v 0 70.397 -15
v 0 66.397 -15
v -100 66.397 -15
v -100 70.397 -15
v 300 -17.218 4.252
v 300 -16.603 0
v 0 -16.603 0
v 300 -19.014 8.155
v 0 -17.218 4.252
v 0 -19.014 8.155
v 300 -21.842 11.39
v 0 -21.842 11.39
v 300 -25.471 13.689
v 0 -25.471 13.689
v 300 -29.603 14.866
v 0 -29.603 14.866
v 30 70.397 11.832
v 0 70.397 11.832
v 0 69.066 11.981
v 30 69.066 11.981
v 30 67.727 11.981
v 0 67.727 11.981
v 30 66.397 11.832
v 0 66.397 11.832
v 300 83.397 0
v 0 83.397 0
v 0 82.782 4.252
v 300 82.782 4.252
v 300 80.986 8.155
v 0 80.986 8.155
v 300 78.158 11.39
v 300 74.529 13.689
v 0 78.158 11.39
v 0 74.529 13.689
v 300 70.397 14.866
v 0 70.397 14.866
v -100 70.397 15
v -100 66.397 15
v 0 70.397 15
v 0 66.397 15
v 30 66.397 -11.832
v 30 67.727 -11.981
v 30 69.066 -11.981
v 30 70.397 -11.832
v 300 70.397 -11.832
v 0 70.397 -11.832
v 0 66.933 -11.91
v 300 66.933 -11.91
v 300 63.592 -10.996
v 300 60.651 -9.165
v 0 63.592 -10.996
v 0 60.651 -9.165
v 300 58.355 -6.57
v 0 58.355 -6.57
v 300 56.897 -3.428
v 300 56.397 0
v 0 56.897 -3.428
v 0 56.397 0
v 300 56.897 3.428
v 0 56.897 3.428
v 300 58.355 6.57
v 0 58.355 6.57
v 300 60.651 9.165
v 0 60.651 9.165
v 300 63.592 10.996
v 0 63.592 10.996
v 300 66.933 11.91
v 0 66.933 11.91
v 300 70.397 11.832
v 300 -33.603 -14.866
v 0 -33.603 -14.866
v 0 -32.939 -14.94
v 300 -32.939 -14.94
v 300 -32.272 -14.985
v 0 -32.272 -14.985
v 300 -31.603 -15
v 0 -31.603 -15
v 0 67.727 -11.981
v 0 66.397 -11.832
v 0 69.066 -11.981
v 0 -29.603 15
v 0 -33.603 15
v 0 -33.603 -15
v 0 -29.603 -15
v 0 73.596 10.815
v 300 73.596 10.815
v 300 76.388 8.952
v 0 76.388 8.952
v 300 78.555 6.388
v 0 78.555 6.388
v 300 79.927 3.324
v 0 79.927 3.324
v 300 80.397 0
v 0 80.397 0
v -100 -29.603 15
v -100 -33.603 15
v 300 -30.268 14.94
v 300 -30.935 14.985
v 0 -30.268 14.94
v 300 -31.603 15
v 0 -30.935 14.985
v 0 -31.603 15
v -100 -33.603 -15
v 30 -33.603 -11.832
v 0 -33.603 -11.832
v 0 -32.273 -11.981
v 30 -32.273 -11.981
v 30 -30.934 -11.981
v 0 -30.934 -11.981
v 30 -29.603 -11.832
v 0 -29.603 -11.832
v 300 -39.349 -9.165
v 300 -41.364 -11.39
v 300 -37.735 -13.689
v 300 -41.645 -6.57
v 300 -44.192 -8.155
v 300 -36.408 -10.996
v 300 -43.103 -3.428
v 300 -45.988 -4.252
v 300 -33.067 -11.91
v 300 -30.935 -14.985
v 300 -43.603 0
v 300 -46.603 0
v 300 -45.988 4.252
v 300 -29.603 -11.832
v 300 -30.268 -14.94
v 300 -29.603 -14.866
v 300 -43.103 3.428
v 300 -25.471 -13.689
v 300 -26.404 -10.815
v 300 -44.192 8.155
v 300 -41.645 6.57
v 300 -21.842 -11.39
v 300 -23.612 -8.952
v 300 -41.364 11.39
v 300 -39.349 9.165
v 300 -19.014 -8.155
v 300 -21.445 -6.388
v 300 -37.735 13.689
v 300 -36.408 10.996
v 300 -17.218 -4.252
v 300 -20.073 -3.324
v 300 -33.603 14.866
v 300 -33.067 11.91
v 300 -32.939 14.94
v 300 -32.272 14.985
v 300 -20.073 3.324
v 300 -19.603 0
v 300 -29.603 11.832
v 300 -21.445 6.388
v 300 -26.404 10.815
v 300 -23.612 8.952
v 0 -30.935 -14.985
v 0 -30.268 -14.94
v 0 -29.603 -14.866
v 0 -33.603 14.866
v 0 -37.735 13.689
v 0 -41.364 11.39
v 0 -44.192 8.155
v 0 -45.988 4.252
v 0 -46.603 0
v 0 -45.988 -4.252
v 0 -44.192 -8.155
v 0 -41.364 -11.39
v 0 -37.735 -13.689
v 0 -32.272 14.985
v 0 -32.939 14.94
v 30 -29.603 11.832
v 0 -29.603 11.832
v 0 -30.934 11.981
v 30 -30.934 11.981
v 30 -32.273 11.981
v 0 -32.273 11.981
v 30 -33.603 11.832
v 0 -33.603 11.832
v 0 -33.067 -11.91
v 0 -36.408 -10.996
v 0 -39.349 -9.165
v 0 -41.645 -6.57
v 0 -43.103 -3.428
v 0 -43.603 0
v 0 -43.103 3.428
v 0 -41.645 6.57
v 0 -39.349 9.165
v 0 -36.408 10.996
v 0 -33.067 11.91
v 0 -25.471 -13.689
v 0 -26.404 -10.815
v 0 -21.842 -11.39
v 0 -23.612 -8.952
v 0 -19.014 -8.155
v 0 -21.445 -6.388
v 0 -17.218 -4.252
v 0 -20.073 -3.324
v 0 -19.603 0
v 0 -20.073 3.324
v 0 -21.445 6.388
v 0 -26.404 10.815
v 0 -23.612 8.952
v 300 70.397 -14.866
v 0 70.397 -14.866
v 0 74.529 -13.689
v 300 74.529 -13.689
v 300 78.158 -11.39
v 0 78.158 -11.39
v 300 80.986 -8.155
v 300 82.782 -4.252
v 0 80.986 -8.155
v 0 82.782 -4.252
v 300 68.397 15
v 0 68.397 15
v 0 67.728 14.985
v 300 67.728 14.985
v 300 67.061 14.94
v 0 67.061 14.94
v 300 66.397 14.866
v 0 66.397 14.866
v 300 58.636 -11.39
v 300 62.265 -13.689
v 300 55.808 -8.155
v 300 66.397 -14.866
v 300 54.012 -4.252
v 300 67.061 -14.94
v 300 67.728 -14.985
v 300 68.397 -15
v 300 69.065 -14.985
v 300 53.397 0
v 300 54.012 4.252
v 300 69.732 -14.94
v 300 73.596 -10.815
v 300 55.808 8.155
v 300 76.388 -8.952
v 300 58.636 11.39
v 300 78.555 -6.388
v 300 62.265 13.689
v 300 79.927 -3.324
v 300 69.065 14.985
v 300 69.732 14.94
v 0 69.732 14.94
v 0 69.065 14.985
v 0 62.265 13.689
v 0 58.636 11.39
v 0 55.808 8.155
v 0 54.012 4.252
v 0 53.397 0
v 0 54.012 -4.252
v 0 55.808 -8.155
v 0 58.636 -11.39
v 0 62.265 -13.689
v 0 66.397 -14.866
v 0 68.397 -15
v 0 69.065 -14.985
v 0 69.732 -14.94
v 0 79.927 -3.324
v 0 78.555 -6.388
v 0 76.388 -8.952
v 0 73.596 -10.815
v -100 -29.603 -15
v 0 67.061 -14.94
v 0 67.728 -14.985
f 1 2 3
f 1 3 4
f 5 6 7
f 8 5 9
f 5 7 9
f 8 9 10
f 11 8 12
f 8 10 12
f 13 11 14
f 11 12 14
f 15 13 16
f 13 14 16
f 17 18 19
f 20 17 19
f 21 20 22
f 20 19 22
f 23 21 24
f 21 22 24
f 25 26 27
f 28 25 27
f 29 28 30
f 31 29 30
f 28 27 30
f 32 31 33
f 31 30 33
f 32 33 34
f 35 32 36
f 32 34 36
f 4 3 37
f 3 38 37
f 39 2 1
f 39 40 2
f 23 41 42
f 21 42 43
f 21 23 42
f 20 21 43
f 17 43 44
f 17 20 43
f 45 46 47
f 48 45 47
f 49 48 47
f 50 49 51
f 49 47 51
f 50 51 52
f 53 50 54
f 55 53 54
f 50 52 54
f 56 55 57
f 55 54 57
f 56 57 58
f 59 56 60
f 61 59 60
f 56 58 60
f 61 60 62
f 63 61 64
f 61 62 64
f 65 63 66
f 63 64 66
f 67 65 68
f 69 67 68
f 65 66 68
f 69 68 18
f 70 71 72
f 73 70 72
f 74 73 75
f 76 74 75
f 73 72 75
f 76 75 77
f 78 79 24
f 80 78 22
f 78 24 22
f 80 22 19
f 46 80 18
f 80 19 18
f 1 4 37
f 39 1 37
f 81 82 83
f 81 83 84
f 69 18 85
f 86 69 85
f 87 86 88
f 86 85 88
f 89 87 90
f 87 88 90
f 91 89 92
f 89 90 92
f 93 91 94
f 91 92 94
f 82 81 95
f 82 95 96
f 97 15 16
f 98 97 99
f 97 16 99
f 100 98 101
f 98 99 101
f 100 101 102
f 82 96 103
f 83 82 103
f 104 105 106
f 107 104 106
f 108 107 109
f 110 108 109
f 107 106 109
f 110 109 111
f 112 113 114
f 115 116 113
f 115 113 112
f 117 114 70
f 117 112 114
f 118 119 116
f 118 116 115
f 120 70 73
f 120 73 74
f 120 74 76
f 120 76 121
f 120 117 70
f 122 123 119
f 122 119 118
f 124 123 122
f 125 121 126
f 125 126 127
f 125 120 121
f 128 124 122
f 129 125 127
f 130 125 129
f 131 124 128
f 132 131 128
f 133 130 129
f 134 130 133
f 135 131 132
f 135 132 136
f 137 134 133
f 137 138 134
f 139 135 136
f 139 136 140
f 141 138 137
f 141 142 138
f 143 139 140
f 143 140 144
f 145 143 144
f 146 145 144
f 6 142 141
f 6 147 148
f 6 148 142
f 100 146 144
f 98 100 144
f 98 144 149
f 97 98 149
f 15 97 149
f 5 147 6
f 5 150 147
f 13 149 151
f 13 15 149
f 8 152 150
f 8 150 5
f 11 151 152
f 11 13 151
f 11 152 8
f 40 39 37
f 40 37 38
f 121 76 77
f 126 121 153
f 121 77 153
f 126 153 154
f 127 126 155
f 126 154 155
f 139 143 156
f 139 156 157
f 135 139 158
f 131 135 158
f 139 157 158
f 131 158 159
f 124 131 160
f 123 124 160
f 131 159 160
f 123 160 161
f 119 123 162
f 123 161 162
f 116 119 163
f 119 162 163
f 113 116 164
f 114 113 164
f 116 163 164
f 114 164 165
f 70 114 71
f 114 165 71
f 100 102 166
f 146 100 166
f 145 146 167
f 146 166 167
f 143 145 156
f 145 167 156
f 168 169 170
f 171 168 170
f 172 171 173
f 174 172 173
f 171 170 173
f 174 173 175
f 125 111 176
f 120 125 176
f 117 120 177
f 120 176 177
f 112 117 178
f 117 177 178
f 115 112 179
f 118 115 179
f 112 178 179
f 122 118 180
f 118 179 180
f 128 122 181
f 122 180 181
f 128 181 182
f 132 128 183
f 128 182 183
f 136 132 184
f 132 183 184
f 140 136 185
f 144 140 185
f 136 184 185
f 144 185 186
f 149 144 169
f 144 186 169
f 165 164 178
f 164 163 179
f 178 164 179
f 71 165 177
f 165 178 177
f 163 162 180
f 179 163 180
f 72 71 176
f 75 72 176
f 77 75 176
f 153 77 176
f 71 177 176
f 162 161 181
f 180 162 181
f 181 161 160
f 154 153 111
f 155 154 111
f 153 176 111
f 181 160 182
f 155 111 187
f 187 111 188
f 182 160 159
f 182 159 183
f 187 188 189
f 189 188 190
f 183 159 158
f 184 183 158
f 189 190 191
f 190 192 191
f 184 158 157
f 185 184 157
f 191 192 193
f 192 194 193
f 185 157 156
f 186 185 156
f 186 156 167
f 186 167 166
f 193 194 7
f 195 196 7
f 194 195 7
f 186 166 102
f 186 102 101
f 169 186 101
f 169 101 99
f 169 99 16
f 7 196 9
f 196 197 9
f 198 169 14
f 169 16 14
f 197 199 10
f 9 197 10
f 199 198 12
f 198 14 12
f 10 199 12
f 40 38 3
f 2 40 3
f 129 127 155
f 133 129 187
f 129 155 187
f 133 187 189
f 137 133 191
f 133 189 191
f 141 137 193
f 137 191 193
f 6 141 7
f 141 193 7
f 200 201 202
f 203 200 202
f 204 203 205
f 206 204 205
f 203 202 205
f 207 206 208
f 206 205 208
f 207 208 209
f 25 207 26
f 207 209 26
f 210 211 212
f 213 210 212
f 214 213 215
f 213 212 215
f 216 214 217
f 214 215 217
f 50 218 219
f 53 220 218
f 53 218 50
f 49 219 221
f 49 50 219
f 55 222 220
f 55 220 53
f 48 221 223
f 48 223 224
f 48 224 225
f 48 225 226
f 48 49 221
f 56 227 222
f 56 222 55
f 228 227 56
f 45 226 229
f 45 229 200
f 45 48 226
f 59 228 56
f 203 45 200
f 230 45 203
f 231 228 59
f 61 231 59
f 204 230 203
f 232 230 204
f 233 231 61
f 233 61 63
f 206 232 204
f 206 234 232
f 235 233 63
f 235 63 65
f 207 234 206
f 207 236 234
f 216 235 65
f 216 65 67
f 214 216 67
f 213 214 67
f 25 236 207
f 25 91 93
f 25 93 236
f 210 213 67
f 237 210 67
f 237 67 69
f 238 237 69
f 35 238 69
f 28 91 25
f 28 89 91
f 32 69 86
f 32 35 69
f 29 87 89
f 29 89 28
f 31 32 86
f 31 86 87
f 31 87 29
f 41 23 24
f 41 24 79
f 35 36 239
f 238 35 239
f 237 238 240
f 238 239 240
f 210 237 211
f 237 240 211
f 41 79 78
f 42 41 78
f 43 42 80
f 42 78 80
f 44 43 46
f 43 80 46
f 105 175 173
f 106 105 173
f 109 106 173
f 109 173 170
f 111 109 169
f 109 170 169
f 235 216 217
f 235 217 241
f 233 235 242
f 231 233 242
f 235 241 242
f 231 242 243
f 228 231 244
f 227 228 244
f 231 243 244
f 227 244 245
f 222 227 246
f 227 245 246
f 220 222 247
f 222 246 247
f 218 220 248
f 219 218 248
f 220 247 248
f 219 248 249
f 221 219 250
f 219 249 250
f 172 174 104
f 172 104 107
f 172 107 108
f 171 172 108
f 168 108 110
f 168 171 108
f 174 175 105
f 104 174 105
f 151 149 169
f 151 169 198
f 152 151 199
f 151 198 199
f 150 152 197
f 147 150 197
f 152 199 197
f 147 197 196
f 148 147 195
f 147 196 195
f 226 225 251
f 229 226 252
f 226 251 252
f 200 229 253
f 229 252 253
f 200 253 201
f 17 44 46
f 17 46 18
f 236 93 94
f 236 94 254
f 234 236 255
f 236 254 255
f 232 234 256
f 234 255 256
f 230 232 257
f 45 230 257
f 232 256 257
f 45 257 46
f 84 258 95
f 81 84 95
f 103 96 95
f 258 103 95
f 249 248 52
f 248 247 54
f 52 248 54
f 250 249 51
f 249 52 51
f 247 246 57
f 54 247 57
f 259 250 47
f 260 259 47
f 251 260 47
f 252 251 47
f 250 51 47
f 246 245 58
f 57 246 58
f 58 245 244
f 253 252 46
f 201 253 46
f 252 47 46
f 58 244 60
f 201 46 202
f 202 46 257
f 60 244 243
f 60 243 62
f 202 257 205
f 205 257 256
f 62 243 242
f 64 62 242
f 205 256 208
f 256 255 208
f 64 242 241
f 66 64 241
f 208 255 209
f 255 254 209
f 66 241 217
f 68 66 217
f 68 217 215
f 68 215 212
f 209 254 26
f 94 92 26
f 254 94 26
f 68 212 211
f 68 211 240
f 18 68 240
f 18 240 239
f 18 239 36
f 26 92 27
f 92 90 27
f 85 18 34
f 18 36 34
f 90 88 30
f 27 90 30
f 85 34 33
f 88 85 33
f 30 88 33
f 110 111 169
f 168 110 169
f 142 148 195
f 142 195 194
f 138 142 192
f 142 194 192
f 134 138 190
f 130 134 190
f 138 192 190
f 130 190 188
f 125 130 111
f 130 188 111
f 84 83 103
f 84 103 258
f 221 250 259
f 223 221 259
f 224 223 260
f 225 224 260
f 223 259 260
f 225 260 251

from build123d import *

# Parameters (mm, degrees)
F1_DEPTH = 100
F2_DEPTH = 300
F3_DEPTH = 30


with BuildPart() as f1:
    # F0 (on Right) → F1 (new body)
    with BuildSketch(Plane.YZ):
        with BuildLine():
            Line((70.3968688385, -11.8321595662), (70.3968688385, 11.8321595662))
            ThreePointArc((70.3968688385, 11.8321595662), (68.3968688385, 12), (66.3968688385, 11.8321595662))
            Line((66.3968688385, 11.8321595662), (66.3968688385, -11.8321595662))
            ThreePointArc((66.3968688385, -11.8321595662), (68.3968688385, -12), (70.3968688385, -11.8321595662))
        make_face()
        with BuildLine():
            Line((66.3968688385, -15), (68.3968688385, -15))
            ThreePointArc((68.3968688385, -15), (67.3946291491, -14.9664797332), (66.3968688385, -14.8660687473))
            Line((66.3968688385, -14.8660687473), (66.3968688385, -15))
        make_face()
        with BuildLine():
            Line((70.3968688385, -15), (70.3968688385, -14.8660687473))
            ThreePointArc((70.3968688385, -14.8660687473), (69.399108528, -14.9664797332), (68.3968688385, -15))
            Line((68.3968688385, -15), (70.3968688385, -15))
        make_face()
        with BuildLine():
            ThreePointArc((68.3968688385, -15), (69.399108528, -14.9664797332), (70.3968688385, -14.8660687473))
            Line((70.3968688385, -14.8660687473), (70.3968688385, -11.8321595662))
            ThreePointArc((70.3968688385, -11.8321595662), (68.3968688385, -12), (66.3968688385, -11.8321595662))
            Line((66.3968688385, -11.8321595662), (66.3968688385, -14.8660687473))
            ThreePointArc((66.3968688385, -14.8660687473), (67.3946291491, -14.9664797332), (68.3968688385, -15))
        make_face()
        with BuildLine():
            Line((70.3968688385, 11.8321595662), (70.3968688385, 14.8660687473))
            ThreePointArc((70.3968688385, 14.8660687473), (69.399108528, 14.9664797332), (68.3968688385, 15))
            ThreePointArc((68.3968688385, 15), (67.3946291491, 14.9664797332), (66.3968688385, 14.8660687473))
            Line((66.3968688385, 14.8660687473), (66.3968688385, 11.8321595662))
            ThreePointArc((66.3968688385, 11.8321595662), (68.3968688385, 12), (70.3968688385, 11.8321595662))
        make_face()
        with BuildLine():
            ThreePointArc((66.3968688385, 14.8660687473), (67.3946291491, 14.9664797332), (68.3968688385, 15))
            Line((68.3968688385, 15), (66.3968688385, 15))
            Line((66.3968688385, 15), (66.3968688385, 14.8660687473))
        make_face()
        with BuildLine():
            ThreePointArc((68.3968688385, 15), (69.399108528, 14.9664797332), (70.3968688385, 14.8660687473))
            Line((70.3968688385, 14.8660687473), (70.3968688385, 15))
            Line((70.3968688385, 15), (68.3968688385, 15))
        make_face()
    extrude(amount=-F1_DEPTH)


with BuildPart() as f1b:
    # F0 (on Right) → F1, piece 2 (new body)
    with BuildSketch(Plane.YZ):
        with BuildLine():
            ThreePointArc((-31.6031311615, 15), (-30.600891472, 14.9664797332), (-29.6031311615, 14.8660687473))
            Line((-29.6031311615, 14.8660687473), (-29.6031311615, 15))
            Line((-29.6031311615, 15), (-31.6031311615, 15))
        make_face()
        with BuildLine():
            ThreePointArc((-33.6031311615, 14.8660687473), (-32.6053708509, 14.9664797332), (-31.6031311615, 15))
            Line((-31.6031311615, 15), (-33.6031311615, 15))
            Line((-33.6031311615, 15), (-33.6031311615, 14.8660687473))
        make_face()
        with BuildLine():
            Line((-29.6031311615, 11.8321595662), (-29.6031311615, 14.8660687473))
            ThreePointArc((-29.6031311615, 14.8660687473), (-30.600891472, 14.9664797332), (-31.6031311615, 15))
            ThreePointArc((-31.6031311615, 15), (-32.6053708509, 14.9664797332), (-33.6031311615, 14.8660687473))
            Line((-33.6031311615, 14.8660687473), (-33.6031311615, 11.8321595662))
            ThreePointArc((-33.6031311615, 11.8321595662), (-31.6031311615, 12), (-29.6031311615, 11.8321595662))
        make_face()
        with BuildLine():
            Line((-29.6031311615, -11.8321595662), (-29.6031311615, 11.8321595662))
            ThreePointArc((-29.6031311615, 11.8321595662), (-31.6031311615, 12), (-33.6031311615, 11.8321595662))
            Line((-33.6031311615, 11.8321595662), (-33.6031311615, -11.8321595662))
            ThreePointArc((-33.6031311615, -11.8321595662), (-31.6031311615, -12), (-29.6031311615, -11.8321595662))
        make_face()
        with BuildLine():
            ThreePointArc((-31.6031311615, -15), (-30.600891472, -14.9664797332), (-29.6031311615, -14.8660687473))
            Line((-29.6031311615, -14.8660687473), (-29.6031311615, -11.8321595662))
            ThreePointArc((-29.6031311615, -11.8321595662), (-31.6031311615, -12), (-33.6031311615, -11.8321595662))
            Line((-33.6031311615, -11.8321595662), (-33.6031311615, -14.8660687473))
            ThreePointArc((-33.6031311615, -14.8660687473), (-32.6053708509, -14.9664797332), (-31.6031311615, -15))
        make_face()
        with BuildLine():
            Line((-29.6031311615, -15), (-29.6031311615, -14.8660687473))
            ThreePointArc((-29.6031311615, -14.8660687473), (-30.600891472, -14.9664797332), (-31.6031311615, -15))
            Line((-31.6031311615, -15), (-29.6031311615, -15))
        make_face()
        with BuildLine():
            Line((-33.6031311615, -15), (-31.6031311615, -15))
            ThreePointArc((-31.6031311615, -15), (-32.6053708509, -14.9664797332), (-33.6031311615, -14.8660687473))
            Line((-33.6031311615, -14.8660687473), (-33.6031311615, -15))
        make_face()
    extrude(amount=-F1_DEPTH)


with BuildPart() as f2:
    # F0 (on Right) → F2 (new body)
    with BuildSketch(Plane.YZ):
        with BuildLine():
            ThreePointArc((70.3968688385, -14.8660687473), (79.6884586292, -9.8742088291), (83.3968688385, 0))
            ThreePointArc((83.3968688385, 0), (79.6884586292, 9.8742088291), (70.3968688385, 14.8660687473))
            Line((70.3968688385, 14.8660687473), (70.3968688385, 11.8321595662))
            ThreePointArc((70.3968688385, 11.8321595662), (77.5620202285, 7.7459666924), (80.3968688385, 0))
            ThreePointArc((80.3968688385, 0), (77.5620202285, -7.7459666924), (70.3968688385, -11.8321595662))
            Line((70.3968688385, -11.8321595662), (70.3968688385, -14.8660687473))
        make_face()
        with BuildLine():
            Line((70.3968688385, 11.8321595662), (70.3968688385, 14.8660687473))
            ThreePointArc((70.3968688385, 14.8660687473), (69.399108528, 14.9664797332), (68.3968688385, 15))
            ThreePointArc((68.3968688385, 15), (67.3946291491, 14.9664797332), (66.3968688385, 14.8660687473))
            Line((66.3968688385, 14.8660687473), (66.3968688385, 11.8321595662))
            ThreePointArc((66.3968688385, 11.8321595662), (68.3968688385, 12), (70.3968688385, 11.8321595662))
        make_face()
        with BuildLine():
            Line((66.3968688385, 11.8321595662), (66.3968688385, 14.8660687473))
            ThreePointArc((66.3968688385, 14.8660687473), (53.3968688385, 0), (66.3968688385, -14.8660687473))
            Line((66.3968688385, -14.8660687473), (66.3968688385, -11.8321595662))
            ThreePointArc((66.3968688385, -11.8321595662), (56.3968688385, 0), (66.3968688385, 11.8321595662))
        make_face()
        with BuildLine():
            ThreePointArc((68.3968688385, -15), (69.399108528, -14.9664797332), (70.3968688385, -14.8660687473))
            Line((70.3968688385, -14.8660687473), (70.3968688385, -11.8321595662))
            ThreePointArc((70.3968688385, -11.8321595662), (68.3968688385, -12), (66.3968688385, -11.8321595662))
            Line((66.3968688385, -11.8321595662), (66.3968688385, -14.8660687473))
            ThreePointArc((66.3968688385, -14.8660687473), (67.3946291491, -14.9664797332), (68.3968688385, -15))
        make_face()
    extrude(amount=F2_DEPTH)


with BuildPart() as f2b:
    # F0 (on Right) → F2, piece 2 (new body)
    with BuildSketch(Plane.YZ):
        with BuildLine():
            Line((-33.6031311615, 11.8321595662), (-33.6031311615, 14.8660687473))
            ThreePointArc((-33.6031311615, 14.8660687473), (-46.6031311615, 0), (-33.6031311615, -14.8660687473))
            Line((-33.6031311615, -14.8660687473), (-33.6031311615, -11.8321595662))
            ThreePointArc((-33.6031311615, -11.8321595662), (-43.6031311615, 0), (-33.6031311615, 11.8321595662))
        make_face()
        with BuildLine():
            Line((-29.6031311615, 11.8321595662), (-29.6031311615, 14.8660687473))
            ThreePointArc((-29.6031311615, 14.8660687473), (-30.600891472, 14.9664797332), (-31.6031311615, 15))
            ThreePointArc((-31.6031311615, 15), (-32.6053708509, 14.9664797332), (-33.6031311615, 14.8660687473))
            Line((-33.6031311615, 14.8660687473), (-33.6031311615, 11.8321595662))
            ThreePointArc((-33.6031311615, 11.8321595662), (-31.6031311615, 12), (-29.6031311615, 11.8321595662))
        make_face()
        with BuildLine():
            ThreePointArc((-29.6031311615, -14.8660687473), (-20.3115413708, -9.8742088291), (-16.6031311615, 0))
            ThreePointArc((-16.6031311615, 0), (-20.3115413708, 9.8742088291), (-29.6031311615, 14.8660687473))
            Line((-29.6031311615, 14.8660687473), (-29.6031311615, 11.8321595662))
            ThreePointArc((-29.6031311615, 11.8321595662), (-22.4379797715, 7.7459666924), (-19.6031311615, 0))
            ThreePointArc((-19.6031311615, 0), (-22.4379797715, -7.7459666924), (-29.6031311615, -11.8321595662))
            Line((-29.6031311615, -11.8321595662), (-29.6031311615, -14.8660687473))
        make_face()
        with BuildLine():
            ThreePointArc((-31.6031311615, -15), (-30.600891472, -14.9664797332), (-29.6031311615, -14.8660687473))
            Line((-29.6031311615, -14.8660687473), (-29.6031311615, -11.8321595662))
            ThreePointArc((-29.6031311615, -11.8321595662), (-31.6031311615, -12), (-33.6031311615, -11.8321595662))
            Line((-33.6031311615, -11.8321595662), (-33.6031311615, -14.8660687473))
            ThreePointArc((-33.6031311615, -14.8660687473), (-32.6053708509, -14.9664797332), (-31.6031311615, -15))
        make_face()
    extrude(amount=F2_DEPTH)


with BuildPart() as f3:
    # F0 (on Right) → F3 (new body)
    with BuildSketch(Plane.YZ):
        with BuildLine():
            Line((70.3968688385, -11.8321595662), (70.3968688385, 11.8321595662))
            ThreePointArc((70.3968688385, 11.8321595662), (68.3968688385, 12), (66.3968688385, 11.8321595662))
            Line((66.3968688385, 11.8321595662), (66.3968688385, -11.8321595662))
            ThreePointArc((66.3968688385, -11.8321595662), (68.3968688385, -12), (70.3968688385, -11.8321595662))
        make_face()
    extrude(amount=F3_DEPTH)


with BuildPart() as f3b:
    # F0 (on Right) → F3, piece 2 (new body)
    with BuildSketch(Plane.YZ):
        with BuildLine():
            Line((-29.6031311615, -11.8321595662), (-29.6031311615, 11.8321595662))
            ThreePointArc((-29.6031311615, 11.8321595662), (-31.6031311615, 12), (-33.6031311615, 11.8321595662))
            Line((-33.6031311615, 11.8321595662), (-33.6031311615, -11.8321595662))
            ThreePointArc((-33.6031311615, -11.8321595662), (-31.6031311615, -12), (-29.6031311615, -11.8321595662))
        make_face()
    extrude(amount=F3_DEPTH)


solid = Compound([f1.part, f1b.part, f2.part, f2b.part, f3.part, f3b.part])
